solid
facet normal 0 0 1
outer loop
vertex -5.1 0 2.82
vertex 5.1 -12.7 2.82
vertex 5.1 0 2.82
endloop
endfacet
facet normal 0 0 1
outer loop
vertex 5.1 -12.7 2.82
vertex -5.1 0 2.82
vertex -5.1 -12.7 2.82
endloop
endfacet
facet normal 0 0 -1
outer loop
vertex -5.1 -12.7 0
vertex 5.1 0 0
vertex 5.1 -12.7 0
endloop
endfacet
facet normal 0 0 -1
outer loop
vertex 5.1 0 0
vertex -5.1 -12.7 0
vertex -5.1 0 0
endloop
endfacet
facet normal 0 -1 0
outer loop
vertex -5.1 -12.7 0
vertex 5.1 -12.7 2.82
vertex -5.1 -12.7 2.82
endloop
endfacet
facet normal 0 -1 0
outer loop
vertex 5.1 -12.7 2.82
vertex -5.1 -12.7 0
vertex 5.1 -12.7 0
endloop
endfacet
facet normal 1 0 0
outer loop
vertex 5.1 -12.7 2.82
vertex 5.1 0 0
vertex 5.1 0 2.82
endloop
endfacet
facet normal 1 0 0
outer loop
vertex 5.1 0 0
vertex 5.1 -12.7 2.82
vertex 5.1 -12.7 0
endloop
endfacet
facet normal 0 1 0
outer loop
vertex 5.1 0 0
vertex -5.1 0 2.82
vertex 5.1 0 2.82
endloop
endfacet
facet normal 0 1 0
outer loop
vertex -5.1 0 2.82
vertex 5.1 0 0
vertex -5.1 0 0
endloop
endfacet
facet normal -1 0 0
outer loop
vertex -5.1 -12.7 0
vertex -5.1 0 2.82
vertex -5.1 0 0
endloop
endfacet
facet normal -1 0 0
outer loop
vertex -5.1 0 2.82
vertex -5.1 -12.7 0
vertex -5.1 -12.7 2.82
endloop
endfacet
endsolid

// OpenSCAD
// Pololu regulator module
translate([-5.1,-12.7,0])cube([10.2,12.7,2.82]);
